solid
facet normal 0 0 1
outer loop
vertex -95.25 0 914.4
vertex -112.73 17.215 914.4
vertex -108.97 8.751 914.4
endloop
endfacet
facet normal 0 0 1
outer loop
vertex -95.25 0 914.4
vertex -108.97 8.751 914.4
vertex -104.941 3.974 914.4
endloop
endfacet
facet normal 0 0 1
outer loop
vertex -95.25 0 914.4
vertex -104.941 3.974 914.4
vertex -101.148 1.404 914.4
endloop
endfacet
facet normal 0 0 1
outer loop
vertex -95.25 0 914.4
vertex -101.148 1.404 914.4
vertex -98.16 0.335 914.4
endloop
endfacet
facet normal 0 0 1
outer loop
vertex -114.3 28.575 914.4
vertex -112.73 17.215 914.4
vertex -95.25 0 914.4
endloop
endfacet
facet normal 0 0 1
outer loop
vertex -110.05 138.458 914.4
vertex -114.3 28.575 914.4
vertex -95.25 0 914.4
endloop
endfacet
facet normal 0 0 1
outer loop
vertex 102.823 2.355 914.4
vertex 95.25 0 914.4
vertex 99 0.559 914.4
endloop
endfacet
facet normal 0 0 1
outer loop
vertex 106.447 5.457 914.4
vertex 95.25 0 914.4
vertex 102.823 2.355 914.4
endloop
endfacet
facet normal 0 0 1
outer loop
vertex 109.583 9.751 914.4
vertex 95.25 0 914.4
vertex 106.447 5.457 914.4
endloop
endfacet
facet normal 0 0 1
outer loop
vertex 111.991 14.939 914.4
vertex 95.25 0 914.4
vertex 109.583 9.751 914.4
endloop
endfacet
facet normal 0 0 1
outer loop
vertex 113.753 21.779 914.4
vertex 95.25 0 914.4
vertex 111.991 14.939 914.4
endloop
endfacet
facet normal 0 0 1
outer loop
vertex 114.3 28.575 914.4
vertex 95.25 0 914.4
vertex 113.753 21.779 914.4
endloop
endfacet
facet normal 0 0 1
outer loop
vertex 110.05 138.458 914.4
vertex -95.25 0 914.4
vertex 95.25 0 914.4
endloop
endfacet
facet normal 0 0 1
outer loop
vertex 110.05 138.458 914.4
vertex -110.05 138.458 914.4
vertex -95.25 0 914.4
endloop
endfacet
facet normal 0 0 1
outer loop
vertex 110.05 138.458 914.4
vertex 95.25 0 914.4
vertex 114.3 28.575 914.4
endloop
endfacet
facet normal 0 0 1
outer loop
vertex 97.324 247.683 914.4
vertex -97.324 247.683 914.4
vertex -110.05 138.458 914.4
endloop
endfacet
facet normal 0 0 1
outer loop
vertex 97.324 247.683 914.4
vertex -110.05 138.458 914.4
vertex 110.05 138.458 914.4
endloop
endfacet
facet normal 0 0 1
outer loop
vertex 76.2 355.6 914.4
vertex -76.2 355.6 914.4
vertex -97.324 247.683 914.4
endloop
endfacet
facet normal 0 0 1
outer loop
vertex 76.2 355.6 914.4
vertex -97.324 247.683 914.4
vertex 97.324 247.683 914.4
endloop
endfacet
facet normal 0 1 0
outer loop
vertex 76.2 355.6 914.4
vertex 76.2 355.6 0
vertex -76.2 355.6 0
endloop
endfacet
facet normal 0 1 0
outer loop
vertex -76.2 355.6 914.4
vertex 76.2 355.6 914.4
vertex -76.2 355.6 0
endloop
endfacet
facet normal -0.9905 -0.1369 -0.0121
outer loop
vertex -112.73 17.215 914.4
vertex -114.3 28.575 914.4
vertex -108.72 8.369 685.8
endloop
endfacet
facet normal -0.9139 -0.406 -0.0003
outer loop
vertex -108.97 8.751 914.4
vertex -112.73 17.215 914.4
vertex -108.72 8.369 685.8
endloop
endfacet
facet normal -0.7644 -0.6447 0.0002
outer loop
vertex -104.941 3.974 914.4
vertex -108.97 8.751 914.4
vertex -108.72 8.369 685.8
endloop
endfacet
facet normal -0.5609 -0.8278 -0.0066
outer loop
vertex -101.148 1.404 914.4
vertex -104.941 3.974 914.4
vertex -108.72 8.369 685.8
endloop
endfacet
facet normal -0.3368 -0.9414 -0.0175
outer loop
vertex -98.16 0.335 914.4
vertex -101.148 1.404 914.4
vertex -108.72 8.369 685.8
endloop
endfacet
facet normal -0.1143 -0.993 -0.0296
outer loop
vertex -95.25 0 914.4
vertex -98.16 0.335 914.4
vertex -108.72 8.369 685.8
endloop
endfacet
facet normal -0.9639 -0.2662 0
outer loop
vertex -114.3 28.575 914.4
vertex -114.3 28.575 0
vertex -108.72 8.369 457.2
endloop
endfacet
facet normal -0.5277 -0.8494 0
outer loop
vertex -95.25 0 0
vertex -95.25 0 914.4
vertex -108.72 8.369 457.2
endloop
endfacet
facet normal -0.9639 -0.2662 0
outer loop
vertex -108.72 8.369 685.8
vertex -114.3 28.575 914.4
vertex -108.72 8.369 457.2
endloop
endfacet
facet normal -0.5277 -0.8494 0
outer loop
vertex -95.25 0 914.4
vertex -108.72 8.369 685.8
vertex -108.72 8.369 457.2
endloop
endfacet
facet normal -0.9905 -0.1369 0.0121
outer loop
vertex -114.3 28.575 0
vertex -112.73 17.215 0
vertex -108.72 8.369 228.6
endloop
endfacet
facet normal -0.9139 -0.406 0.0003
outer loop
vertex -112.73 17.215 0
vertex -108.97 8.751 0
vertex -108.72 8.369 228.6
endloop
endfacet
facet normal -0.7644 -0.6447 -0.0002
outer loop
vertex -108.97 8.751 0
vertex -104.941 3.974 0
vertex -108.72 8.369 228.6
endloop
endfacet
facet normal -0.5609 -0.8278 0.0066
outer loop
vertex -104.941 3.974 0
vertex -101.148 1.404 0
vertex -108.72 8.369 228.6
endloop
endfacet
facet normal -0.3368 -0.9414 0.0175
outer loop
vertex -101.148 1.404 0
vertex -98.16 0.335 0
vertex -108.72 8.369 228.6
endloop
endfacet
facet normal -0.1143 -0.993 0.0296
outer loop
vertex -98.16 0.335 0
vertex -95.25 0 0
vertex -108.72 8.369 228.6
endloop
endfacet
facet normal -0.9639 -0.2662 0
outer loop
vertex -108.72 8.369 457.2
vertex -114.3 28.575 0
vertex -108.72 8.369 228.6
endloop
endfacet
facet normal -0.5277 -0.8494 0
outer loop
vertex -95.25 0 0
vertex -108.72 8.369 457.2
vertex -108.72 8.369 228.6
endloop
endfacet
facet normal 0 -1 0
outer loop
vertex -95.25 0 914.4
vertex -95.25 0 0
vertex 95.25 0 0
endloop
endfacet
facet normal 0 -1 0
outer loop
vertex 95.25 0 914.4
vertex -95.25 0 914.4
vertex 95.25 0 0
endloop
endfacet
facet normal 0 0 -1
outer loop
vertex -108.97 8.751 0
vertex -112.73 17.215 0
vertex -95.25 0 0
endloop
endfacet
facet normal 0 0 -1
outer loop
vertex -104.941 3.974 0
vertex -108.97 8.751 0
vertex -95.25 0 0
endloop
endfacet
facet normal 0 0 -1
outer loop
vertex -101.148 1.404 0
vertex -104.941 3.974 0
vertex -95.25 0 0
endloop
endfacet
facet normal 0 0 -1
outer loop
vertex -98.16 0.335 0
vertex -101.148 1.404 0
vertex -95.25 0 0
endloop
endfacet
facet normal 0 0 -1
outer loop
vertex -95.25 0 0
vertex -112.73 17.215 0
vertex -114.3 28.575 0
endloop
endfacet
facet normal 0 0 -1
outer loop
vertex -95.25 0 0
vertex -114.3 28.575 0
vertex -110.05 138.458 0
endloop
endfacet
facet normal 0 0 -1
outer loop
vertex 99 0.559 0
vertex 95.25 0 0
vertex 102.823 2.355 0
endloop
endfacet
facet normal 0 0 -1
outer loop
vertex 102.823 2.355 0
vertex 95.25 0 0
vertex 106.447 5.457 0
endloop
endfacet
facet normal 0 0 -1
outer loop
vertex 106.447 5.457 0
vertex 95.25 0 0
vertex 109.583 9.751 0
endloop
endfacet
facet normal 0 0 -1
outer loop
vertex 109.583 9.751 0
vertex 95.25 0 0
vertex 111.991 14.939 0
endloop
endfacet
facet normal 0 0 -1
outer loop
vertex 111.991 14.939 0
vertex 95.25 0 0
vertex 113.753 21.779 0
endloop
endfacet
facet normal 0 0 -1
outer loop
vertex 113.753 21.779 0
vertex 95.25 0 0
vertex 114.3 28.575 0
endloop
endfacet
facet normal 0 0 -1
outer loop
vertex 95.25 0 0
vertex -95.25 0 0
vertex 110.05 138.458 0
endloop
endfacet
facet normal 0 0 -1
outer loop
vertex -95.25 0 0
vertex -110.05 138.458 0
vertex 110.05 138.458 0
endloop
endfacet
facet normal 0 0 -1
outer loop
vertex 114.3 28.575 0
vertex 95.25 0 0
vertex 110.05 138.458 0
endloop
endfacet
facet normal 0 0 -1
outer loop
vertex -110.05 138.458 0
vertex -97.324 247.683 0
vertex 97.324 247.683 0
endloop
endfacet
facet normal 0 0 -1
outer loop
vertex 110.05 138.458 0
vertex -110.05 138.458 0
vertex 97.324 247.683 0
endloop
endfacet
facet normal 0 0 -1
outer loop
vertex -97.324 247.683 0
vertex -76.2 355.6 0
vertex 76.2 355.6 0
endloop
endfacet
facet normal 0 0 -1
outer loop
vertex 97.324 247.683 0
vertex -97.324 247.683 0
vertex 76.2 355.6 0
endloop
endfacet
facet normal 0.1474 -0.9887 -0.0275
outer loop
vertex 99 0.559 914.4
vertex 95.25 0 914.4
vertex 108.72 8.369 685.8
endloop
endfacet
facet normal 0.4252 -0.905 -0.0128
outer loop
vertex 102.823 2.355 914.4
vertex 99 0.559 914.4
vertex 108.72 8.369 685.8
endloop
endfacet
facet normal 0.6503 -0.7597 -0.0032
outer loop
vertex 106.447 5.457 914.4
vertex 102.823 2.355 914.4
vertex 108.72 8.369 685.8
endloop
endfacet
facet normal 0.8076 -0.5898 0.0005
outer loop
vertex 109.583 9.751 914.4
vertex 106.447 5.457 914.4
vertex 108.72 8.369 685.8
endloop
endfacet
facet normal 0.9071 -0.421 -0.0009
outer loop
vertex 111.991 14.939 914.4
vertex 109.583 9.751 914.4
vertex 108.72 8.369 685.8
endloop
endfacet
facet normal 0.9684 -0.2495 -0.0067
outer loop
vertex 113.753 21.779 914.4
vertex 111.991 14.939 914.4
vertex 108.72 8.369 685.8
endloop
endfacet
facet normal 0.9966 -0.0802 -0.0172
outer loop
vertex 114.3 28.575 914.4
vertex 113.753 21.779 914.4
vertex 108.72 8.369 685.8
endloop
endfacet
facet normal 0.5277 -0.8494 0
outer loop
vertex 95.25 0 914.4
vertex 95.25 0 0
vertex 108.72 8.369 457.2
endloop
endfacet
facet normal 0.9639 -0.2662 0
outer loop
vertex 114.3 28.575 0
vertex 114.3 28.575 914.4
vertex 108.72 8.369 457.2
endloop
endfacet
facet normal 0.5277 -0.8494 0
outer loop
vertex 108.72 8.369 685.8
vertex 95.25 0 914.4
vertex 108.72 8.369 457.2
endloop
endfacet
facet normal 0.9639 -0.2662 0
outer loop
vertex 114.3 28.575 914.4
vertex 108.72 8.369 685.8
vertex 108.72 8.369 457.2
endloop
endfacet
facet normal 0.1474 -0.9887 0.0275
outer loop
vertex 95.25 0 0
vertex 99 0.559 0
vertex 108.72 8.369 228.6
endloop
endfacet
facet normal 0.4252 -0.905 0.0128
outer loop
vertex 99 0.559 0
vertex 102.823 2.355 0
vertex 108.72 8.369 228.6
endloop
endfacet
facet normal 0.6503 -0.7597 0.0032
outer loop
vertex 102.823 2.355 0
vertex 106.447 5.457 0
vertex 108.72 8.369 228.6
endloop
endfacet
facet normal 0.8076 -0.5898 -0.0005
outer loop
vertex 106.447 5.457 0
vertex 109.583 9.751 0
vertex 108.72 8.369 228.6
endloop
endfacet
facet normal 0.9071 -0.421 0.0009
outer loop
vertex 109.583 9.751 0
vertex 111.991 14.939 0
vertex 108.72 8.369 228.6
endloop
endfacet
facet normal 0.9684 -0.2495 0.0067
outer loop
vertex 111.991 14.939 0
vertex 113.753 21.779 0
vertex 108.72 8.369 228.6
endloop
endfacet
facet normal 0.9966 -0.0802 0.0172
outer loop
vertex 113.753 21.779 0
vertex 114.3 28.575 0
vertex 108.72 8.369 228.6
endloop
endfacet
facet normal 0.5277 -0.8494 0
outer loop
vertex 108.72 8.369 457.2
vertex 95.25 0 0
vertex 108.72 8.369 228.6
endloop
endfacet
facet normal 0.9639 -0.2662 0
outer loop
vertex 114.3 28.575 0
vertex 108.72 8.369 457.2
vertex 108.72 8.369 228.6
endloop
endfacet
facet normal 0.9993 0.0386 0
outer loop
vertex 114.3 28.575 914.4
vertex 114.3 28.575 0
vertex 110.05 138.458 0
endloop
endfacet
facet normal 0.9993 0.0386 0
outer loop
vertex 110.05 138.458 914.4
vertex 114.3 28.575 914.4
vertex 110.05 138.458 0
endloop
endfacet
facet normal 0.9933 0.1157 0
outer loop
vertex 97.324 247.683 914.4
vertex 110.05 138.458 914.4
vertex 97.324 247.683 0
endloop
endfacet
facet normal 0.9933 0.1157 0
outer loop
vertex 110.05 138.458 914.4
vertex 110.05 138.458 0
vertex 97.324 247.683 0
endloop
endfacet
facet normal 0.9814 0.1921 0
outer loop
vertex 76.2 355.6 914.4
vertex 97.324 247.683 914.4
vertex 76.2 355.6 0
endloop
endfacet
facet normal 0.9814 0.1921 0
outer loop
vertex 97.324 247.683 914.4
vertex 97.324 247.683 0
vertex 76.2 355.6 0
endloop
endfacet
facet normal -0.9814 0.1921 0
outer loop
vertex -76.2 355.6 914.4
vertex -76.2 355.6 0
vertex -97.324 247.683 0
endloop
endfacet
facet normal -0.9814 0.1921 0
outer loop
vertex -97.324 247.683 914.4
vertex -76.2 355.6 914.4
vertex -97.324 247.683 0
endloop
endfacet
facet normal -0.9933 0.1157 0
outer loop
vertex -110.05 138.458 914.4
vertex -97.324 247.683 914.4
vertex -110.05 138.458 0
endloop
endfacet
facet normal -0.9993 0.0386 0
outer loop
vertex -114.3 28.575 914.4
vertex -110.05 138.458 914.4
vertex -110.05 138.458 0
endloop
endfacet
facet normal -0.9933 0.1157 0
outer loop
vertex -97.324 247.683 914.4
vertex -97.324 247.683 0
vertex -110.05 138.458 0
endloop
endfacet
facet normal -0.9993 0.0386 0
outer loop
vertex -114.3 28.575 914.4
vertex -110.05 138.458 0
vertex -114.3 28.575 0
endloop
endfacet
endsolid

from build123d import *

# Parameters (mm, degrees)
F1_DEPTH = 914.4


with BuildPart() as f1:
    # F0 (on Top) → F1 (new body)
    with BuildSketch(Plane.XY):
        with BuildLine():
            Line((76.2, 355.6), (-76.2, 355.6))
            ThreePointArc((-76.2, 355.6), (-104.742894, 193.193469), (-114.3, 28.575002))
            add(Edge.make_bspline(
                [(-95.25, 57.15), (-114.299999, 57.15), (-114.3, 28.575002)],
                knots=[0, 0, 0, 1.570796, 1.570796, 1.570796], degree=2, weights=[1, 0.707107, 1]))
            add(Edge.make_bspline(
                [(-95.25, 0), (-76.2, 0), (-76.2, 28.575), (-76.2, 57.15), (-95.25, 57.15)],
                knots=[3.141593, 3.141593, 3.141593, 4.712389, 4.712389, 6.283185, 6.283185, 6.283185], degree=2, weights=[1, 0.707107, 1, 0.707107, 1]))
            Line((-95.25, 0), (95.25, 0))
            add(Edge.make_bspline(
                [(95.25, 57.15), (76.2, 57.15), (76.2, 28.575), (76.2, 0), (95.25, 0)],
                knots=[0, 0, 0, 1.570796, 1.570796, 3.141593, 3.141593, 3.141593], degree=2, weights=[1, 0.707107, 1, 0.707107, 1]))
            add(Edge.make_bspline(
                [(114.3, 28.575), (114.3, 57.15), (95.25, 57.15)],
                knots=[4.712389, 4.712389, 4.712389, 6.283185, 6.283185, 6.283185], degree=2, weights=[1, 0.707107, 1]))
            ThreePointArc((114.3, 28.575), (104.742894, 193.193468), (76.2, 355.6))
        make_face()
        with BuildLine():
            add(Edge.make_bspline(
                [(-95.25, 57.15), (-114.299999, 57.15), (-114.3, 28.575002)],
                knots=[0, 0, 0, 1.570796, 1.570796, 1.570796], degree=2, weights=[1, 0.707107, 1]))
            add(Edge.make_bspline(
                [(-114.3, 28.575002), (-114.300001, 0), (-95.25, 0)],
                knots=[1.570796, 1.570796, 1.570796, 3.141593, 3.141593, 3.141593], degree=2, weights=[1, 0.707107, 1]))
            add(Edge.make_bspline(
                [(-95.25, 0), (-76.2, 0), (-76.2, 28.575), (-76.2, 57.15), (-95.25, 57.15)],
                knots=[3.141593, 3.141593, 3.141593, 4.712389, 4.712389, 6.283185, 6.283185, 6.283185], degree=2, weights=[1, 0.707107, 1, 0.707107, 1]))
        make_face()
        with BuildLine():
            add(Edge.make_bspline(
                [(95.25, 0), (114.3, 0), (114.3, 28.575)],
                knots=[3.141593, 3.141593, 3.141593, 4.712389, 4.712389, 4.712389], degree=2, weights=[1, 0.707107, 1]))
            add(Edge.make_bspline(
                [(114.3, 28.575), (114.3, 57.15), (95.25, 57.15)],
                knots=[4.712389, 4.712389, 4.712389, 6.283185, 6.283185, 6.283185], degree=2, weights=[1, 0.707107, 1]))
            add(Edge.make_bspline(
                [(95.25, 57.15), (76.2, 57.15), (76.2, 28.575), (76.2, 0), (95.25, 0)],
                knots=[0, 0, 0, 1.570796, 1.570796, 3.141593, 3.141593, 3.141593], degree=2, weights=[1, 0.707107, 1, 0.707107, 1]))
        make_face()
    extrude(amount=F1_DEPTH)


solid = f1.part
